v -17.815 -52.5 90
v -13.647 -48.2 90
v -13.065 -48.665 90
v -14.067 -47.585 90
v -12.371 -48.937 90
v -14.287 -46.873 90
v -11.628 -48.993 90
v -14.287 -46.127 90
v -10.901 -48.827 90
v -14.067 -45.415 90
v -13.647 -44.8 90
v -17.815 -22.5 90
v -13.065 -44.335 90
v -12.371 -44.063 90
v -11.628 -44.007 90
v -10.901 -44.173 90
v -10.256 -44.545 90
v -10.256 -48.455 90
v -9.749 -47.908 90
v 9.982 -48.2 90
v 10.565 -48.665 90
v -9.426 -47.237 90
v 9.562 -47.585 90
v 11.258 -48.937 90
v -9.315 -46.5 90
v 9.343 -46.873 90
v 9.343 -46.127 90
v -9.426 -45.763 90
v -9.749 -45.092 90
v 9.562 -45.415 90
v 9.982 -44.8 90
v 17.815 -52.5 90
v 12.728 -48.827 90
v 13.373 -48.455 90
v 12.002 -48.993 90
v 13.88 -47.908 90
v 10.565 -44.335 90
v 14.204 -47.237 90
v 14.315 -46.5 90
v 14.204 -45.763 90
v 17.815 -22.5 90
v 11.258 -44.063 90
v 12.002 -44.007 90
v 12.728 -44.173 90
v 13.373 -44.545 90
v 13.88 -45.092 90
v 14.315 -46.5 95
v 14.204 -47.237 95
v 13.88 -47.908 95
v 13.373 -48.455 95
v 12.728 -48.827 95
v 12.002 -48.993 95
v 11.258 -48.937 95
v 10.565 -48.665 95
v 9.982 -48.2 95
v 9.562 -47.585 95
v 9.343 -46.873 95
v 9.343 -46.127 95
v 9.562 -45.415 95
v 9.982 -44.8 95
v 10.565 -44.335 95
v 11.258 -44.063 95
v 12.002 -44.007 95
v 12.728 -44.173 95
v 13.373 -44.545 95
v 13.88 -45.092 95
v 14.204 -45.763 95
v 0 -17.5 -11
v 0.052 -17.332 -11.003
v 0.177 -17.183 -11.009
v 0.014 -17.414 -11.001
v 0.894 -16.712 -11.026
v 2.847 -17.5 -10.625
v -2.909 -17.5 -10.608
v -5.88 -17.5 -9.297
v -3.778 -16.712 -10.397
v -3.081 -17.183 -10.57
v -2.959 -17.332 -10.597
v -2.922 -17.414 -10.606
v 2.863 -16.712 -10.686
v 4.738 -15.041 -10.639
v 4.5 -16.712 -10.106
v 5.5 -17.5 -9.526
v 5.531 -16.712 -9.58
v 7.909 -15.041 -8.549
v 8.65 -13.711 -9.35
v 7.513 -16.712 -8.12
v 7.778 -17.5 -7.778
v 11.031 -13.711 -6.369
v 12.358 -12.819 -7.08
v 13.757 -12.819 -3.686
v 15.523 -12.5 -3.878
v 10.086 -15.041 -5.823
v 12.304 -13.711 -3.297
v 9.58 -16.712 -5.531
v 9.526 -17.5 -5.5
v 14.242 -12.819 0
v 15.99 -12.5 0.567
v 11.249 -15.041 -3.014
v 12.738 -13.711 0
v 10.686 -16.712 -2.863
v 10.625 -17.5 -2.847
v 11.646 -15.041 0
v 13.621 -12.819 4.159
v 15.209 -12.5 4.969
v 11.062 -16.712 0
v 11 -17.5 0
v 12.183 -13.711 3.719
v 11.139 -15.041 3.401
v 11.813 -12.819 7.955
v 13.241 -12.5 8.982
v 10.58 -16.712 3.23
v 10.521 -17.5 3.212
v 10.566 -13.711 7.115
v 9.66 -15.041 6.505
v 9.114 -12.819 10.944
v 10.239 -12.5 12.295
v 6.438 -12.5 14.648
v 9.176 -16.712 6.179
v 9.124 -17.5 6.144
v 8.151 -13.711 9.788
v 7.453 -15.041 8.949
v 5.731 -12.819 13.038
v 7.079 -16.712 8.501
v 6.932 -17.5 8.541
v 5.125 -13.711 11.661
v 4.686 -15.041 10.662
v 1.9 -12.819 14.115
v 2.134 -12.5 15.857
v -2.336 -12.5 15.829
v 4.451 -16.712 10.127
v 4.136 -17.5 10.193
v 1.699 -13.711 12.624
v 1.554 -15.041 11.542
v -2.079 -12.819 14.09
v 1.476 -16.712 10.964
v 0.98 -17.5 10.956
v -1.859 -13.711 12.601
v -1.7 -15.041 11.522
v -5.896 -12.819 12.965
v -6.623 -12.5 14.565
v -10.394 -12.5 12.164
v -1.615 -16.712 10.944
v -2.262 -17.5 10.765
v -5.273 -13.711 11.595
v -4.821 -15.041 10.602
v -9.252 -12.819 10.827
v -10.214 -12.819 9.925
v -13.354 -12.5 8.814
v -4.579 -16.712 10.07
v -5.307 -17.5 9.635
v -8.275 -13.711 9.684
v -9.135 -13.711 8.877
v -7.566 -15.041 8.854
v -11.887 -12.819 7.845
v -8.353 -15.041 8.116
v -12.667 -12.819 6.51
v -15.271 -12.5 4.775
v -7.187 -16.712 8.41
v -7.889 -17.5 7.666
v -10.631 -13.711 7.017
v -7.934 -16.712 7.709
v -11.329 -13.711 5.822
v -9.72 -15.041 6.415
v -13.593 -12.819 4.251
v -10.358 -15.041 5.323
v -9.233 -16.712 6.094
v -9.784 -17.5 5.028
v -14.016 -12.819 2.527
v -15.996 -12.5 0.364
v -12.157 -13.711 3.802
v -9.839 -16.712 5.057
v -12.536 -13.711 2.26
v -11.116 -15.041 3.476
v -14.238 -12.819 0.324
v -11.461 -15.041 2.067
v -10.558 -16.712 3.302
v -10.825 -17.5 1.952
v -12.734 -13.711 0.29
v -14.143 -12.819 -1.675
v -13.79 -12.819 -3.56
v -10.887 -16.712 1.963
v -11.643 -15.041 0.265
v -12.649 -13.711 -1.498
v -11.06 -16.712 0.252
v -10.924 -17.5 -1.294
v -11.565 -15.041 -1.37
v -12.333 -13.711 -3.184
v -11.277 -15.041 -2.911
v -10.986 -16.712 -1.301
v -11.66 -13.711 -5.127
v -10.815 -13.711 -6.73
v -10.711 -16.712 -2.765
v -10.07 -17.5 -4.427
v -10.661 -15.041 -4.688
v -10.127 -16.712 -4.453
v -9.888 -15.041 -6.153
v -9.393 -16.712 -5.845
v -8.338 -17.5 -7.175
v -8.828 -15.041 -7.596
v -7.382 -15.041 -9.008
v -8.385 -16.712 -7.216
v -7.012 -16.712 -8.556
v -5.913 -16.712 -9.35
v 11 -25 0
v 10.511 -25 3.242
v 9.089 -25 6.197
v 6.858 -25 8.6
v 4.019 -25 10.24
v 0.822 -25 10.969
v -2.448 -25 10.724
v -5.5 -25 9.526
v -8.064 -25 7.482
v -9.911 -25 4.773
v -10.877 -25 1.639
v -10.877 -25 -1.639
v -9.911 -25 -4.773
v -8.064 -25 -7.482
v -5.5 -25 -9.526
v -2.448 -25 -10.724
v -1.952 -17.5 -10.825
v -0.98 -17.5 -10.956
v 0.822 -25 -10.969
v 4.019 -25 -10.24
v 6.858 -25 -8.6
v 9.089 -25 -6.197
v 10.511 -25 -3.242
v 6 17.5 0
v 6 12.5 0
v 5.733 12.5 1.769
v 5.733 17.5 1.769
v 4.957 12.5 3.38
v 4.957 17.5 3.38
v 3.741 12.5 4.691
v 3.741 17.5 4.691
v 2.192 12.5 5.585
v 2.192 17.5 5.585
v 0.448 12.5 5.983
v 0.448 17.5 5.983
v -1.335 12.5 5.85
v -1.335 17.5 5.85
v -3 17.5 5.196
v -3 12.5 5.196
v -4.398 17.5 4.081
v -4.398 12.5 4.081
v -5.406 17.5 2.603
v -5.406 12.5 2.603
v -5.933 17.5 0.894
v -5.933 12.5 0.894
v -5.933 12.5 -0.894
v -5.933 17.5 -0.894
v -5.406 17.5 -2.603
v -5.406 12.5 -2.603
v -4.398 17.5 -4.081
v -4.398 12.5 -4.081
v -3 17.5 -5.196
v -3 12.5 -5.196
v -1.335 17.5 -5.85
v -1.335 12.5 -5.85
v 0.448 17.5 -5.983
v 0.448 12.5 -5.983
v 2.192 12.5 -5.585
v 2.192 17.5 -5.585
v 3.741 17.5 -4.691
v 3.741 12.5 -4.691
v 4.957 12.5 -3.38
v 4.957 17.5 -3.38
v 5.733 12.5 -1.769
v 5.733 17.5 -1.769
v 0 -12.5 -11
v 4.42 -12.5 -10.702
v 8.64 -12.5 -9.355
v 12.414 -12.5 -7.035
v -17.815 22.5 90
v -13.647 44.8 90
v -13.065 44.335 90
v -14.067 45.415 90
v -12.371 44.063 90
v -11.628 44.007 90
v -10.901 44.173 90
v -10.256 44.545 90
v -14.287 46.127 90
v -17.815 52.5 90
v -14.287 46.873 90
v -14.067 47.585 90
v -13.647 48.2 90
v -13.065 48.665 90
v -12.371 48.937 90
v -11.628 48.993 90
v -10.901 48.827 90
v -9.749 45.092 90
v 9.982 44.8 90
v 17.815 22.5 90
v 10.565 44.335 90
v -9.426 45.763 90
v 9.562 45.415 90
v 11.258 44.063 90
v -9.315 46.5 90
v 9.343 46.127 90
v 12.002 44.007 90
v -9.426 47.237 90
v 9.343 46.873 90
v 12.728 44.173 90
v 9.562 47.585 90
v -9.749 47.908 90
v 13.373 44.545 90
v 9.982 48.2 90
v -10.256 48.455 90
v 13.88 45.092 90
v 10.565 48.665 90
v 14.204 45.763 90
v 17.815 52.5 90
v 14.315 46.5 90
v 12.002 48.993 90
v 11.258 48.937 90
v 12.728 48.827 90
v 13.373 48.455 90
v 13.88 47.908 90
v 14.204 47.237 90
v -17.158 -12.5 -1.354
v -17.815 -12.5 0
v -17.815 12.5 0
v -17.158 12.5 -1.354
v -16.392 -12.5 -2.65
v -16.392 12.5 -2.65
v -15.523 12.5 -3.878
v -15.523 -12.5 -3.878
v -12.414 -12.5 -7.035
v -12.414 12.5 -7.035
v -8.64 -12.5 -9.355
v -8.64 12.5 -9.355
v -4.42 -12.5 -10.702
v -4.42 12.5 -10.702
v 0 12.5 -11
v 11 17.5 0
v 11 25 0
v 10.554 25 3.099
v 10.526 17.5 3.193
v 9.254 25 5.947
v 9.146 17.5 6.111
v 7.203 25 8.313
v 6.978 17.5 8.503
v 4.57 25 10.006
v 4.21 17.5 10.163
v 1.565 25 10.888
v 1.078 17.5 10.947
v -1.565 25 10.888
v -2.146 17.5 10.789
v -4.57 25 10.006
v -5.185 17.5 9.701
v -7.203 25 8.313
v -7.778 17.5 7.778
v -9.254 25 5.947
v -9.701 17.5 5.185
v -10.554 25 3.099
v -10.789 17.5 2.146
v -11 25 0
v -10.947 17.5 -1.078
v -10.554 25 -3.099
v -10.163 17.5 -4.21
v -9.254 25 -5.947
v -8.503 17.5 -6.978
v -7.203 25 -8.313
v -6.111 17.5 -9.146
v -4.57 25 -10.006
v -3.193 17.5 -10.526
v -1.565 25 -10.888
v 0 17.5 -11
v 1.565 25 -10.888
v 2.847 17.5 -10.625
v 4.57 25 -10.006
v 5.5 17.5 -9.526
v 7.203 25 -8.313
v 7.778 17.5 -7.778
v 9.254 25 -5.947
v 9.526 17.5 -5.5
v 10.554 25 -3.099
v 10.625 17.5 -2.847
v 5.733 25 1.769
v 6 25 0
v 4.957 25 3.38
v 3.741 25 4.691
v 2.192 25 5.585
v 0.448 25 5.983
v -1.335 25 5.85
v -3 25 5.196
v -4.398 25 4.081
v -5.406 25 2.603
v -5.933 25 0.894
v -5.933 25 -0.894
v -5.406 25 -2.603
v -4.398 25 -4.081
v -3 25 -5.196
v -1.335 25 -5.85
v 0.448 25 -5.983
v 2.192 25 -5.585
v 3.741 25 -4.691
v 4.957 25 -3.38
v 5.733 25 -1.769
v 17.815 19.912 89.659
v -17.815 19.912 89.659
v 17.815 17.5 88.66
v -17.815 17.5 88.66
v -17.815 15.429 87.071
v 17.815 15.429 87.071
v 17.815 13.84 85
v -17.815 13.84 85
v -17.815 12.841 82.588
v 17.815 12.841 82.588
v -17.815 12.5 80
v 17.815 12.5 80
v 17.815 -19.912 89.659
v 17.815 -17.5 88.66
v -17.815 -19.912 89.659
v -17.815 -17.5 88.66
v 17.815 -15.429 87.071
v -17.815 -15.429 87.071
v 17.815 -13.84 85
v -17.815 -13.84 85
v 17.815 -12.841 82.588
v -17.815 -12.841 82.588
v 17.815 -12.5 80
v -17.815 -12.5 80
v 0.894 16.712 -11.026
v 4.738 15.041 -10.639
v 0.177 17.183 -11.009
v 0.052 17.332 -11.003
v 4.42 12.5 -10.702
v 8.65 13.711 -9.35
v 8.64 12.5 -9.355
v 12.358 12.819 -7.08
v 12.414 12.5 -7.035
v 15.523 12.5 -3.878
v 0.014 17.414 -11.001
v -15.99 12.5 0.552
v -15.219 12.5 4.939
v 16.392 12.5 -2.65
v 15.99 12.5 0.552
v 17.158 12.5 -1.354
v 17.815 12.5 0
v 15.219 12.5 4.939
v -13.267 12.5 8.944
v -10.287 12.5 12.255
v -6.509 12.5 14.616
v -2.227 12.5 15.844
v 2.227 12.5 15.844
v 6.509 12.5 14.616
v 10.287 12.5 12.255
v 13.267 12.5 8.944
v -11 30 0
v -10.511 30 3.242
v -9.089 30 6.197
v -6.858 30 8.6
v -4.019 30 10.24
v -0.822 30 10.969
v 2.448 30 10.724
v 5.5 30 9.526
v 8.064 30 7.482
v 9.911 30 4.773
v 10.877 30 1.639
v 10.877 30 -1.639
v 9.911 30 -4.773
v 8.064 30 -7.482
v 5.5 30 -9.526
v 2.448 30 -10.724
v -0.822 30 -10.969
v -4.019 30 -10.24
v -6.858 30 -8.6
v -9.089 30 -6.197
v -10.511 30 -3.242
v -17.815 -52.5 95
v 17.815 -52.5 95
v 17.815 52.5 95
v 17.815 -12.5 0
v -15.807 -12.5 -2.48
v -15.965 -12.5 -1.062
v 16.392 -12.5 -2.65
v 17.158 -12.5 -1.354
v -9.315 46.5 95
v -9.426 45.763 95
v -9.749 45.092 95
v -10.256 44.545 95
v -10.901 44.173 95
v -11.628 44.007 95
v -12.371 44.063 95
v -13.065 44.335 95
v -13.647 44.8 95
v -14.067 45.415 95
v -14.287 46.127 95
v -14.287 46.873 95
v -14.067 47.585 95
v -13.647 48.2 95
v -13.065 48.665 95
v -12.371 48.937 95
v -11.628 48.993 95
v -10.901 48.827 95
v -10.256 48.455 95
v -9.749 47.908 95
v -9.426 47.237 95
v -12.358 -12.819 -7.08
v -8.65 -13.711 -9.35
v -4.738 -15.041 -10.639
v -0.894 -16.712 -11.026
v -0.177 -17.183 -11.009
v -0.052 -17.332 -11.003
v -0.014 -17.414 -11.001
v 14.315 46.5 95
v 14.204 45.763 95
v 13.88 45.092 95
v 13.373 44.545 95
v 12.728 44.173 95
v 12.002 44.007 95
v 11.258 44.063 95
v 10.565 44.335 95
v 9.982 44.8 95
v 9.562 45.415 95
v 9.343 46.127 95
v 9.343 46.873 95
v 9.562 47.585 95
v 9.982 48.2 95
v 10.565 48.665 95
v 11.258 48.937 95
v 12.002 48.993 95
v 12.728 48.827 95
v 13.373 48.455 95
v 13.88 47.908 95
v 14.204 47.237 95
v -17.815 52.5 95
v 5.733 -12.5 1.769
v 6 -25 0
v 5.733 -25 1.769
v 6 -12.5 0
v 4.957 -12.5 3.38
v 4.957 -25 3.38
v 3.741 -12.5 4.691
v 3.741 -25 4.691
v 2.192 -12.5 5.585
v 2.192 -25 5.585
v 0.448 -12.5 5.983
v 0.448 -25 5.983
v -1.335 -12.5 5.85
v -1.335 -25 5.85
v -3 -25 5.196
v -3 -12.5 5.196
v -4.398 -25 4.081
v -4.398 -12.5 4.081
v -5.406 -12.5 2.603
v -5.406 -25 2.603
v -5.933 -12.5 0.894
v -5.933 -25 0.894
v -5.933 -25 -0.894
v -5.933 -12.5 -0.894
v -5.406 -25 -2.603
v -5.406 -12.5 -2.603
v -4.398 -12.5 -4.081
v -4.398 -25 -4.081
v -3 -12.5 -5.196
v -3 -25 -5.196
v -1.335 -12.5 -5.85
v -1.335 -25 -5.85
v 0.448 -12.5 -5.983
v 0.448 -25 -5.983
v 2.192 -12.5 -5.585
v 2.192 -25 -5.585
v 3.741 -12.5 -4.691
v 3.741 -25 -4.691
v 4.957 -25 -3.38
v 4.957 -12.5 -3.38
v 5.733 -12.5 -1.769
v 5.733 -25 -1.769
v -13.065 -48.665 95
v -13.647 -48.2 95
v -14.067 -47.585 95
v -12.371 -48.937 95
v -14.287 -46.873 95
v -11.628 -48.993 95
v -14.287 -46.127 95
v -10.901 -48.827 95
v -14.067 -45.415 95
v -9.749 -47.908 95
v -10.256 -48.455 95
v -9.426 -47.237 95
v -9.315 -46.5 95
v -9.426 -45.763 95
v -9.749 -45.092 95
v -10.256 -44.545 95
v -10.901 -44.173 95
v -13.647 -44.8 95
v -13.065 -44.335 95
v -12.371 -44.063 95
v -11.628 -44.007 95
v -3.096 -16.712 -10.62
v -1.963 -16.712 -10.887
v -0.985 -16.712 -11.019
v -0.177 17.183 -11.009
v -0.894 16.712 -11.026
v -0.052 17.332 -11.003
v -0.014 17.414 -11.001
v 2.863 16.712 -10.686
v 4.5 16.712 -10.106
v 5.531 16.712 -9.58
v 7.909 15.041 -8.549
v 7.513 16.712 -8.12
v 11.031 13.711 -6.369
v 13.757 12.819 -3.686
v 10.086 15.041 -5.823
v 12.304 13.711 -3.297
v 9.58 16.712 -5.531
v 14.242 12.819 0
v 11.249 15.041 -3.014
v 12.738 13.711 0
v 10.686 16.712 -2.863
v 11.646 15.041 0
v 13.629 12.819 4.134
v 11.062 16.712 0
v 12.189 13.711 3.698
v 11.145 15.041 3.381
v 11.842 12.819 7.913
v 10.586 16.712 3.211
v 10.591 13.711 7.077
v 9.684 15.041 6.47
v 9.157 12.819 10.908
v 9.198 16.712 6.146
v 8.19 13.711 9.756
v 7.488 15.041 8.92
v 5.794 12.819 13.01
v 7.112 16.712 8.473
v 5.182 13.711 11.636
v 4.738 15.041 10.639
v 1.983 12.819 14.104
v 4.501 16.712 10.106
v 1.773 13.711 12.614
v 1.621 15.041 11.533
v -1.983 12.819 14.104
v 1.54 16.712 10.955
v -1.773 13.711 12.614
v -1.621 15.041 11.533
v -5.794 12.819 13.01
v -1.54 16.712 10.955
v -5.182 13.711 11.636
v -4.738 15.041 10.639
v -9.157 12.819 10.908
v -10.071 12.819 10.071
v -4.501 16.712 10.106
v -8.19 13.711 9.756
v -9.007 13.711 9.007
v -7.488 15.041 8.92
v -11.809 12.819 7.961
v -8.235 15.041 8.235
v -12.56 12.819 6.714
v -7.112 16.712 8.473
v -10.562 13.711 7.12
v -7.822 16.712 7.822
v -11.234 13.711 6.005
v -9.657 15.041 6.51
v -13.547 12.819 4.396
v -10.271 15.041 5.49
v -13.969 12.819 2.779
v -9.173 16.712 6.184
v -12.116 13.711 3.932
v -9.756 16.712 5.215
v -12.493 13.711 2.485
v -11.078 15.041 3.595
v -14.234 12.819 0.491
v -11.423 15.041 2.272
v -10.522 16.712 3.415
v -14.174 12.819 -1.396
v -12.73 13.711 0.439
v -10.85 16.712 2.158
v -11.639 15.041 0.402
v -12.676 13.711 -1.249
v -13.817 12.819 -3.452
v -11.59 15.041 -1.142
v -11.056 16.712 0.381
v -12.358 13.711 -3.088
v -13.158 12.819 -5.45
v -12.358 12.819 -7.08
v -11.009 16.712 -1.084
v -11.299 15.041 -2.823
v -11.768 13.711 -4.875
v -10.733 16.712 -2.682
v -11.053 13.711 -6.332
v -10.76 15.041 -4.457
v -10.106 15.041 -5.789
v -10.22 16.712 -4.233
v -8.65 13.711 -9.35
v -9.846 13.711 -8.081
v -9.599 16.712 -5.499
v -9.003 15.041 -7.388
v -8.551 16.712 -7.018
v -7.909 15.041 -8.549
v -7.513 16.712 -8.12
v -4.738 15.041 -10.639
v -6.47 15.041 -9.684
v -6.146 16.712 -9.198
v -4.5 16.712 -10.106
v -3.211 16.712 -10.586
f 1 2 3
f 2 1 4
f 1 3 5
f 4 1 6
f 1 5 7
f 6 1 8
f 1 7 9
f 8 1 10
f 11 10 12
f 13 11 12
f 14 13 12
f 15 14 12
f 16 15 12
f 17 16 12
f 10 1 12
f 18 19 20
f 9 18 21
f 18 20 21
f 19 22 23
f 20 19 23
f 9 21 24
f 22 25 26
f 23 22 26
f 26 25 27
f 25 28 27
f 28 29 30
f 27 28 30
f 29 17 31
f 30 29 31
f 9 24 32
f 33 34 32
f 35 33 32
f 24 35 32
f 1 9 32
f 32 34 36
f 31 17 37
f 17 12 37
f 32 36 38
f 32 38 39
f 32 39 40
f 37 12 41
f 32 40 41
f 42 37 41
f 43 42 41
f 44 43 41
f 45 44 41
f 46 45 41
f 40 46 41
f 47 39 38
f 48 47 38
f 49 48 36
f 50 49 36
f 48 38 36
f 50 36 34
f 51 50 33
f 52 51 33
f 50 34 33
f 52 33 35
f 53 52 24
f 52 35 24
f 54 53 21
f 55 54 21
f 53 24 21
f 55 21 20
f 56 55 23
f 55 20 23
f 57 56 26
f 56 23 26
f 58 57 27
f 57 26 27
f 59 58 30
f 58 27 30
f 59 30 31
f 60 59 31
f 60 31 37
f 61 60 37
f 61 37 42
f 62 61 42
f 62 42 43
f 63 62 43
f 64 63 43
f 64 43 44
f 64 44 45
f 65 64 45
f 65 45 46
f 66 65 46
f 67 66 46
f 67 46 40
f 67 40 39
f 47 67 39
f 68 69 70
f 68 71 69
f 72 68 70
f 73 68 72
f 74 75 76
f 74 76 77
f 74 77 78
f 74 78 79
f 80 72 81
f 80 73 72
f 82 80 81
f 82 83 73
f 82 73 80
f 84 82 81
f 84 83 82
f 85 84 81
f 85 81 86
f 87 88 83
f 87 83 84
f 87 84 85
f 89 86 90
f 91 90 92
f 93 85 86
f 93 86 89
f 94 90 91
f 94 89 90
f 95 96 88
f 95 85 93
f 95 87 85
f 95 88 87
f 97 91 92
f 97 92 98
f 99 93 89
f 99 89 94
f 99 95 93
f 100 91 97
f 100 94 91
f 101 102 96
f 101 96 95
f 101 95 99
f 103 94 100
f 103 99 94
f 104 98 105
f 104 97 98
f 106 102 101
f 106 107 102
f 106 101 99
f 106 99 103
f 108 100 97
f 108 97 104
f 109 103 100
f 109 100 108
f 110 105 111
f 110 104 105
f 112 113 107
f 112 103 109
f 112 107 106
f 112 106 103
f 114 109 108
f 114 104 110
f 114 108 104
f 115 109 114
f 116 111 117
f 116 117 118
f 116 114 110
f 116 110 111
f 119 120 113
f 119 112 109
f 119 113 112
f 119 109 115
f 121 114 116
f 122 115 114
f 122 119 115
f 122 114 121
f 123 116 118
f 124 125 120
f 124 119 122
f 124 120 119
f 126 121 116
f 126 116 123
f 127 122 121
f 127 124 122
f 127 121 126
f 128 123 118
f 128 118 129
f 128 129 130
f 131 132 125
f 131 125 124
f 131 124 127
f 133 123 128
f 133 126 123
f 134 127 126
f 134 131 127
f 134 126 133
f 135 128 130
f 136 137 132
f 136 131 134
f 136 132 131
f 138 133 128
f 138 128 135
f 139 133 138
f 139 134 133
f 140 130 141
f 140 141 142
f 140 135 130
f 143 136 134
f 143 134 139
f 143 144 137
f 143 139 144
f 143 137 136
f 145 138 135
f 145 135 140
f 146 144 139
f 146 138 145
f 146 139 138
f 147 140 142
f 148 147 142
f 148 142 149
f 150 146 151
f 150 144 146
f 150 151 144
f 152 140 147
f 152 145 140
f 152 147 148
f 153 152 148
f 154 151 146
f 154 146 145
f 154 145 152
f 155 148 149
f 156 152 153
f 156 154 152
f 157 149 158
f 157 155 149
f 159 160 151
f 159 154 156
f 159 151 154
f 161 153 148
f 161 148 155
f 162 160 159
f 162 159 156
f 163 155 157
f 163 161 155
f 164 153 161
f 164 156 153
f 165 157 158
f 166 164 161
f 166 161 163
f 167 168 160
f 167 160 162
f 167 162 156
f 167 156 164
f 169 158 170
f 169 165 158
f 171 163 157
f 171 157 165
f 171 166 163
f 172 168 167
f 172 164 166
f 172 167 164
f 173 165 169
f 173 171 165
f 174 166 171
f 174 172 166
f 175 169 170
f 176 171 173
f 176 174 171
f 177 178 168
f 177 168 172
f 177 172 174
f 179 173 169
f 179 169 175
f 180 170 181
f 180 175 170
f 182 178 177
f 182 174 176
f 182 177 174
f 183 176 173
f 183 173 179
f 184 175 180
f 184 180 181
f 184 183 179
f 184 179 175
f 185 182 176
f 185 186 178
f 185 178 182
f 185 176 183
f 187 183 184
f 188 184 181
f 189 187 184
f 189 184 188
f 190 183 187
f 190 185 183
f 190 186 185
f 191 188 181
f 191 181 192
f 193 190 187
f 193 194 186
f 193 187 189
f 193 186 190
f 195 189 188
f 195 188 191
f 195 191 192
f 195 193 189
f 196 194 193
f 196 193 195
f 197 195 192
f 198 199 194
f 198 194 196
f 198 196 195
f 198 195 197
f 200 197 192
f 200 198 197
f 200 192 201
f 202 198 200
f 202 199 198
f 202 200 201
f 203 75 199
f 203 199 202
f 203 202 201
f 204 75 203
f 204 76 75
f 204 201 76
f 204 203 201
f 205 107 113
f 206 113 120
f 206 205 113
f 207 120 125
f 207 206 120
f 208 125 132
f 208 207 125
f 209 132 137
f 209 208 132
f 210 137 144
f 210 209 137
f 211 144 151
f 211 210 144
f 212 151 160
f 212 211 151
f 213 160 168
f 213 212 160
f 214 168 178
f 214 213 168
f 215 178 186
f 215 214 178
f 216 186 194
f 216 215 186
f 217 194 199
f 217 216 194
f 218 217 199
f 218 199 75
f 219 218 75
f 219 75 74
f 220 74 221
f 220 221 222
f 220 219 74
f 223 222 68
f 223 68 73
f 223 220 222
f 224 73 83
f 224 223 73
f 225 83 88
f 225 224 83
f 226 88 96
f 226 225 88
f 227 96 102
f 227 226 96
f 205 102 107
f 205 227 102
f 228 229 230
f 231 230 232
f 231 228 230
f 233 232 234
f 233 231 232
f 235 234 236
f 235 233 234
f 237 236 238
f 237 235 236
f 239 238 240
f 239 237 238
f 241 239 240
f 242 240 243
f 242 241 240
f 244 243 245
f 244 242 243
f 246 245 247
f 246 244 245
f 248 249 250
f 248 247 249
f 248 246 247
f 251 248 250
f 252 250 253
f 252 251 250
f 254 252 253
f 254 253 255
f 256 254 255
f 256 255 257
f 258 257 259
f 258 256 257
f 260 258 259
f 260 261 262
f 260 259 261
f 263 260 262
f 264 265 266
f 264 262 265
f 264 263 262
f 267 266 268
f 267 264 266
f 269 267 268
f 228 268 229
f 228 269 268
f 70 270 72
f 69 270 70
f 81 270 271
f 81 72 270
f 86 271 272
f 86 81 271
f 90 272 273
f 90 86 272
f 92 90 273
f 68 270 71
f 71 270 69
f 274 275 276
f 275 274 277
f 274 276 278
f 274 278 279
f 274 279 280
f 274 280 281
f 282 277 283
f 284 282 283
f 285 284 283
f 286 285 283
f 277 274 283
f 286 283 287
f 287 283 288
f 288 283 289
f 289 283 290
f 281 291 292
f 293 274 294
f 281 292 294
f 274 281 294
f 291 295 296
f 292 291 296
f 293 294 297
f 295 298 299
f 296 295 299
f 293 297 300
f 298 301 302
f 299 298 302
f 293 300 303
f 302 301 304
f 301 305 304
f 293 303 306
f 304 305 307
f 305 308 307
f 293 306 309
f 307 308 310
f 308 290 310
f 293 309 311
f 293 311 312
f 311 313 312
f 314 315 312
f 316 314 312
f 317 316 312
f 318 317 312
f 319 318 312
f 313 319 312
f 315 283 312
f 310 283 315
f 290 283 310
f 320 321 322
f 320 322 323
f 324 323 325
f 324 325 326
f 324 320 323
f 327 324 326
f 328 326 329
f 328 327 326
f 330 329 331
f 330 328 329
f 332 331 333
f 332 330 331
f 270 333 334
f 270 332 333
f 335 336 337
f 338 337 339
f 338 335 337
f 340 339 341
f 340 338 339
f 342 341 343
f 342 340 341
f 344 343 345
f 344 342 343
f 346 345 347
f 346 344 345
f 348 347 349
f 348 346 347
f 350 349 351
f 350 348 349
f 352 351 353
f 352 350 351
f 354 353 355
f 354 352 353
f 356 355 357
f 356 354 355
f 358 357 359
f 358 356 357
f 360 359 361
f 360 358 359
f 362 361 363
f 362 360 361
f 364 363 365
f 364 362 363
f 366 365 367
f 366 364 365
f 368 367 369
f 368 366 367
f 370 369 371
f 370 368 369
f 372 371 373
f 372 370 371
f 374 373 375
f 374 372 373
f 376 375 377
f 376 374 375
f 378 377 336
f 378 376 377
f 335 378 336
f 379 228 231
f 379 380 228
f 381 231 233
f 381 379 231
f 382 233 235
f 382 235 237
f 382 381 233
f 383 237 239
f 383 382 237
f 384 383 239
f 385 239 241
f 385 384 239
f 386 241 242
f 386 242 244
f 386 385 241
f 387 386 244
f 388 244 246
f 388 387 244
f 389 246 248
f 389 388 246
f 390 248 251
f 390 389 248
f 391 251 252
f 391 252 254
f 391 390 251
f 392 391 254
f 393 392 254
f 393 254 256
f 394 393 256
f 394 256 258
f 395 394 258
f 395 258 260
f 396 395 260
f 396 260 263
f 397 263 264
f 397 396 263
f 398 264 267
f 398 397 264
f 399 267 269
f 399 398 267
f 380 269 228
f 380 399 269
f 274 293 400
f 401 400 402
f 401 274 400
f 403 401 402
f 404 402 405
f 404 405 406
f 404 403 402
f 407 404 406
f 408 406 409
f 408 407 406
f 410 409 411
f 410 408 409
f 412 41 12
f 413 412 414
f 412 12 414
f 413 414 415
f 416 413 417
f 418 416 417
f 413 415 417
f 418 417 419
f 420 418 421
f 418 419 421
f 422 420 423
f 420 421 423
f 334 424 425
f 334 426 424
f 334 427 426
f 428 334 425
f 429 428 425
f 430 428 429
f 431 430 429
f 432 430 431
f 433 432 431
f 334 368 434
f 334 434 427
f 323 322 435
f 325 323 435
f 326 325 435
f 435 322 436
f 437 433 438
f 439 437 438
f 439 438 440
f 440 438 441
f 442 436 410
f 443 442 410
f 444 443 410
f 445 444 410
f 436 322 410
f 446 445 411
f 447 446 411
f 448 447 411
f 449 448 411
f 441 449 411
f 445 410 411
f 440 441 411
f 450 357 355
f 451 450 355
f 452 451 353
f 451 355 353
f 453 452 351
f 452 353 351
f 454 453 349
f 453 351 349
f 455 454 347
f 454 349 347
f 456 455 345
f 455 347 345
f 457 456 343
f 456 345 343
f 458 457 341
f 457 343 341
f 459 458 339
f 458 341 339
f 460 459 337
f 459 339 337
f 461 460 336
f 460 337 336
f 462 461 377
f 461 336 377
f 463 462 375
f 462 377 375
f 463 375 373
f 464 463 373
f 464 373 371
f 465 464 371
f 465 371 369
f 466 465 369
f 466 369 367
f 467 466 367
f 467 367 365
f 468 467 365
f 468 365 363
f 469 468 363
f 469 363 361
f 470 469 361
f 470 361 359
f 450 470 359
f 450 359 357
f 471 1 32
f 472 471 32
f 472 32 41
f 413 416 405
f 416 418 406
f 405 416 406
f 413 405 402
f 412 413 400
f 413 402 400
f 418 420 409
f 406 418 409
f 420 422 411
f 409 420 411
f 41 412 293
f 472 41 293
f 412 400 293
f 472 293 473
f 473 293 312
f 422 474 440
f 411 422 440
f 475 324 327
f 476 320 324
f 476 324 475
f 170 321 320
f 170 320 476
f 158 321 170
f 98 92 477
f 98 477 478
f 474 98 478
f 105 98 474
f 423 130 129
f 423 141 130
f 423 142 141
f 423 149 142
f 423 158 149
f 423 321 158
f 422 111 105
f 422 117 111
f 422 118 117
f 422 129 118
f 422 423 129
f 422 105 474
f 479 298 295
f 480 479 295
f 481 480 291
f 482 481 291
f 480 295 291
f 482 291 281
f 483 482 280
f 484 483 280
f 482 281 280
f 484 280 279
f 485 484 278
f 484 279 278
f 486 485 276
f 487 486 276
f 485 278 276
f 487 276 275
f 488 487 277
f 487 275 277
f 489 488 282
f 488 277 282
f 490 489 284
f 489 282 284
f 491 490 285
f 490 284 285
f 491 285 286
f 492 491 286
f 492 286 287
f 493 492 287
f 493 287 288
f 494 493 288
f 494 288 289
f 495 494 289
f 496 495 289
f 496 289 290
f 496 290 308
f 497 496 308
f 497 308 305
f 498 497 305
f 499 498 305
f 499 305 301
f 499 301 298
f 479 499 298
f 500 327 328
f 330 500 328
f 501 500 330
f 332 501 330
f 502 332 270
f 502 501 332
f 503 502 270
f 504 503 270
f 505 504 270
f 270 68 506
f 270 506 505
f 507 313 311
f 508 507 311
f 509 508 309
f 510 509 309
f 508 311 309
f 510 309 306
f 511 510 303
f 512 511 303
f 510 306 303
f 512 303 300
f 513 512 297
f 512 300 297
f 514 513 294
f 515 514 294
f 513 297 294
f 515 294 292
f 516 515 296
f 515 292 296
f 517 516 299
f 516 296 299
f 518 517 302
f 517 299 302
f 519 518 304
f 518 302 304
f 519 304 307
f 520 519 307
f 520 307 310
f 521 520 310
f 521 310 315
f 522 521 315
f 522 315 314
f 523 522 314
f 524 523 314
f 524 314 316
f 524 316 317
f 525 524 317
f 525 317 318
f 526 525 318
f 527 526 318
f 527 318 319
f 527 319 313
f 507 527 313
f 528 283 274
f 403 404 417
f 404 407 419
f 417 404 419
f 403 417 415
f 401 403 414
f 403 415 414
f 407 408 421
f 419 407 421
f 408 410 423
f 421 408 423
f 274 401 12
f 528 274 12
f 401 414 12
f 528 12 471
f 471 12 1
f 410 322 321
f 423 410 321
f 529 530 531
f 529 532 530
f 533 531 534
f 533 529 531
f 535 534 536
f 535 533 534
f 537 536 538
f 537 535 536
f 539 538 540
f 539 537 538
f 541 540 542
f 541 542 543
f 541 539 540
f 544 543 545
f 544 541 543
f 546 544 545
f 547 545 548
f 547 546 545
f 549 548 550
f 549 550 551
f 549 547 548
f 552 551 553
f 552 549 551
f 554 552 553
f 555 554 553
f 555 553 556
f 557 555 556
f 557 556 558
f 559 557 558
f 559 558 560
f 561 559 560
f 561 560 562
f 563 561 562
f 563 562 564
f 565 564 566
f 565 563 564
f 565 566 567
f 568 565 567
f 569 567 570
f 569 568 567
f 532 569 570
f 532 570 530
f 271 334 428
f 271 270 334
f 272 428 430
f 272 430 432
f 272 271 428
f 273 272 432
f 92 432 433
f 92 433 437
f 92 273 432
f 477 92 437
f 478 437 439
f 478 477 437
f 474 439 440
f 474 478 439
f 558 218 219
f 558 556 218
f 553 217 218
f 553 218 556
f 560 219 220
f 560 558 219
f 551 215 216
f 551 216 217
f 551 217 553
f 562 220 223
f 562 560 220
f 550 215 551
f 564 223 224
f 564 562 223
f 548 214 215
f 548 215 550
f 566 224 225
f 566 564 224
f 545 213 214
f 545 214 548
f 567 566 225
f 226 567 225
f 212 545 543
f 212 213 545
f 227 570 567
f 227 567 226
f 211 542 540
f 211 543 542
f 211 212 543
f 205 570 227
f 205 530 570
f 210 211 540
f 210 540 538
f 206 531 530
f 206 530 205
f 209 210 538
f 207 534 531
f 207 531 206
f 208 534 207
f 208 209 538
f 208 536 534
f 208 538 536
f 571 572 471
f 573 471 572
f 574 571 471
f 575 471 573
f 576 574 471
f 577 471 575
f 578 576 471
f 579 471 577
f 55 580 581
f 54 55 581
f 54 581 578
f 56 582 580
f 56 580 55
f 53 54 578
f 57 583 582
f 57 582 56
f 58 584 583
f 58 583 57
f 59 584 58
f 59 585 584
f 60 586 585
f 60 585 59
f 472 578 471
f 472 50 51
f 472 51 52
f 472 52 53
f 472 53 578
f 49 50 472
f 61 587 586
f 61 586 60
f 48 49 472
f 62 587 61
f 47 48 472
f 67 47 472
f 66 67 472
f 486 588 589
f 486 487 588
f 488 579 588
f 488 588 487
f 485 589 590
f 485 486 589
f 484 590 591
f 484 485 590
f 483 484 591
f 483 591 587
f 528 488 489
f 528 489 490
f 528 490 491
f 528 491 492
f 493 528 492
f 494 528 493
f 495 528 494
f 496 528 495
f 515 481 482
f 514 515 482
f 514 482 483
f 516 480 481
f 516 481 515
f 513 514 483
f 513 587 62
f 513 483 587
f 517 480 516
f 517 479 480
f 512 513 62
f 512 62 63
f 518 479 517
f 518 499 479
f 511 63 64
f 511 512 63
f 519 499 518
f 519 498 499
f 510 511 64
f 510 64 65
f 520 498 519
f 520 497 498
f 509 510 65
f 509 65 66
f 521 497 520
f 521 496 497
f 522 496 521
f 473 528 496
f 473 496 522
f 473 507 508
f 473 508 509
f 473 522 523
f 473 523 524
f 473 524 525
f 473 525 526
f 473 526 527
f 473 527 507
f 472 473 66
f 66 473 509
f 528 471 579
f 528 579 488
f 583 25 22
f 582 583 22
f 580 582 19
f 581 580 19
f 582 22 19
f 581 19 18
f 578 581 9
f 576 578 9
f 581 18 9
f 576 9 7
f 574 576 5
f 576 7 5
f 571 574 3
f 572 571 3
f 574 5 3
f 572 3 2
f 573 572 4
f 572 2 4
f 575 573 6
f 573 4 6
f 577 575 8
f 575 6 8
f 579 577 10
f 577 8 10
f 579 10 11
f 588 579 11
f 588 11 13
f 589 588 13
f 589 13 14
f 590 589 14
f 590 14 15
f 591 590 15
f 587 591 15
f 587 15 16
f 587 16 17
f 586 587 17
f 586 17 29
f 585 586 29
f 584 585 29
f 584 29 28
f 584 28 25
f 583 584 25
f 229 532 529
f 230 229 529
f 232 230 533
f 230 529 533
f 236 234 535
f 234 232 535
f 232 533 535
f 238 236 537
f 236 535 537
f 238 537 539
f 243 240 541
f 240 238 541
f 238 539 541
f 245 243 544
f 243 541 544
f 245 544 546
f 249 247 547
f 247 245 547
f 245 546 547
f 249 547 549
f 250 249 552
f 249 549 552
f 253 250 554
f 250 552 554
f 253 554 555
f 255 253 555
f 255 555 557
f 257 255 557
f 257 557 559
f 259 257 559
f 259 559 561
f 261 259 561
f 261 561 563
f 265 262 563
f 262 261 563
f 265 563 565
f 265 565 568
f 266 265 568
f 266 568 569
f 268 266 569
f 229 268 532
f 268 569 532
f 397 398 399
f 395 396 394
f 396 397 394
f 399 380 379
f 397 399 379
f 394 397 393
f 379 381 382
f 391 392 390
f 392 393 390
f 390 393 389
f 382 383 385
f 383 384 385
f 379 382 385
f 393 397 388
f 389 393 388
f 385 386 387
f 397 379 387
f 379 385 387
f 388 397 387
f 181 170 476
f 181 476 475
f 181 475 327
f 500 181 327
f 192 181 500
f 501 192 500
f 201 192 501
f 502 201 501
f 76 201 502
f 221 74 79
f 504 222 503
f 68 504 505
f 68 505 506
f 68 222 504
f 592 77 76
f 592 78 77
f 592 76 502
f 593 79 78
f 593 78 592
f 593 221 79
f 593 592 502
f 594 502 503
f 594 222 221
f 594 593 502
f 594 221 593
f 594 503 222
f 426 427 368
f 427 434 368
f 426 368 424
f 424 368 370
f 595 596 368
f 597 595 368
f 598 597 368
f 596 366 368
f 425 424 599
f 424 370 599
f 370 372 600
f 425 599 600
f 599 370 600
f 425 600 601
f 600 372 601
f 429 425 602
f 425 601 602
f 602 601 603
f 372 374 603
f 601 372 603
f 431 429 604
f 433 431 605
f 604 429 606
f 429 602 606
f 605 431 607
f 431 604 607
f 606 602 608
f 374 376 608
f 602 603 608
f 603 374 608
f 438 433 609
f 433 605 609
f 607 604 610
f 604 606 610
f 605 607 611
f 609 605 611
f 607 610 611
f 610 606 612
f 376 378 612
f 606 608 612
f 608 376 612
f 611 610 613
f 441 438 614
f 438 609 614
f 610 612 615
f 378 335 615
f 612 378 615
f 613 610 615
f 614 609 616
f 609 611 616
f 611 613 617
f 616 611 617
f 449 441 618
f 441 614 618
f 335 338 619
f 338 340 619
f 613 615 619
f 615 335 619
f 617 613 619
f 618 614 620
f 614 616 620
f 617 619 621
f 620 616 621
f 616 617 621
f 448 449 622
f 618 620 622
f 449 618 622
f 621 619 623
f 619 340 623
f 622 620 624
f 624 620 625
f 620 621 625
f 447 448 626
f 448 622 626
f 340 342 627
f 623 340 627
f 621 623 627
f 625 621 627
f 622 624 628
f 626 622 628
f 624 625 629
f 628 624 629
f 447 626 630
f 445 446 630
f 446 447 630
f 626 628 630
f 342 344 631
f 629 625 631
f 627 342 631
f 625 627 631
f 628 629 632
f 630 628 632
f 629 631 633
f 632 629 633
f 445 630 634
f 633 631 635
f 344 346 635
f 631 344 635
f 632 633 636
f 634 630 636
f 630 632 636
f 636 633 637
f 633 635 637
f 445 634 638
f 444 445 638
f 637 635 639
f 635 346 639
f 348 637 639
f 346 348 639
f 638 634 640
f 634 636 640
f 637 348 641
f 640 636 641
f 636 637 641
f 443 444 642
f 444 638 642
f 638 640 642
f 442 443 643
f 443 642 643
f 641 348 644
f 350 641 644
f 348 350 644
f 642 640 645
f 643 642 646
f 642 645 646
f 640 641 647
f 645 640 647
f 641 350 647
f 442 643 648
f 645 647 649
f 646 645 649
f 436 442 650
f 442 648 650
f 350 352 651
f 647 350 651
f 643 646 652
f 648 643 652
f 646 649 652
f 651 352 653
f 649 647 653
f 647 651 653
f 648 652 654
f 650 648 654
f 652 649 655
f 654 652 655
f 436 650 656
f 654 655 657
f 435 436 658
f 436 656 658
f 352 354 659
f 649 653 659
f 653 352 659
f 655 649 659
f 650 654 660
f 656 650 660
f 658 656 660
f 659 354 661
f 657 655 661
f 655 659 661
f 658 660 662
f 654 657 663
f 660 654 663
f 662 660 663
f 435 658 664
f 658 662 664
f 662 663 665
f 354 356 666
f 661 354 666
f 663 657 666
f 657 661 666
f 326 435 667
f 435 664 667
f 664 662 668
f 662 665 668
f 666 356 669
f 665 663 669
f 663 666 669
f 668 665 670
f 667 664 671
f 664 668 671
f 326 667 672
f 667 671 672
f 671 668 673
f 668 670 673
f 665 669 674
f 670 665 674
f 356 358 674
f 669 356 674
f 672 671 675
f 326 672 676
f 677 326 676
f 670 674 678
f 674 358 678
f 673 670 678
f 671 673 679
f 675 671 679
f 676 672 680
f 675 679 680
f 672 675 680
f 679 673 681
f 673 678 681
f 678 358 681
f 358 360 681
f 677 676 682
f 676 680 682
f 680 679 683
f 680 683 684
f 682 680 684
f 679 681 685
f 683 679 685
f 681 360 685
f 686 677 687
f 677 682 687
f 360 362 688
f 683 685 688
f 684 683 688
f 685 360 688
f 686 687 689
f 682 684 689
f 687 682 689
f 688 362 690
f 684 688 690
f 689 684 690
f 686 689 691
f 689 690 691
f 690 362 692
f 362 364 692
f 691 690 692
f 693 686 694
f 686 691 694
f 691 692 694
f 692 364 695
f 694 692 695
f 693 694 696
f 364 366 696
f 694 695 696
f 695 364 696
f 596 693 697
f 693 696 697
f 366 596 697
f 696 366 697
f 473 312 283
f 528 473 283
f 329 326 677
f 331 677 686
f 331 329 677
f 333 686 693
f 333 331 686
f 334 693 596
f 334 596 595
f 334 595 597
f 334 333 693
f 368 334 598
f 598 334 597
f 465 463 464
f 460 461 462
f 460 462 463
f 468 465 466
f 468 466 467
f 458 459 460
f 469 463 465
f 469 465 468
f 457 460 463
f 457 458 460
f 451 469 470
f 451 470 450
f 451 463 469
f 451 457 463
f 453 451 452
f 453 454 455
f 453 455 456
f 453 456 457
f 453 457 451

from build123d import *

# Parameters (mm, degrees)
F0_R         = 11
F0_R_2       = 6
F1_DEPTH     = 25
F2_R         = 11
F3_DEPTH     = 5
F5_DEPTH     = 12.5
F7_DEPTH     = 5
F8_R         = 10
F9_T4_ANGLE  = 90
F9_S5_R      = 18.3546430422
F9_T6_DEPTH  = 14
F9_T10_ANGLE = 270
F9_S11_R     = 18.3546430422
F9_T12_DEPTH = 26
F9_T16_ANGLE = 270
F9_S17_R     = 18.3546430422
F9_T18_DEPTH = 26
F9_T22_ANGLE = 270
F9_S23_R     = 18.3546430422
F9_T24_DEPTH = 26
F9_T28_ANGLE = 270
F9_S29_R     = 18.3546430422
F9_T30_DEPTH = 26
F9_T34_ANGLE = 90
F9_S35_R     = 18.3546430422
F9_T36_DEPTH = 14
F10_R        = 6
F11_DEPTH    = 30
F12_R        = 2.5
F13_DEPTH    = 5.001


# Not quite as in the source:
# - a fillet or chamfer that OpenCascade refuses, or shapes differently, is made with other operations: its cross-section is extruded or revolved along the edge and cut away or added


with BuildPart() as f1:
    # F0 (on Front) → F1 (new body, symmetric)
    with BuildSketch(Plane.XZ):
        Circle(F0_R)
        Circle(F0_R_2, mode=Mode.SUBTRACT)
    extrude(amount=F1_DEPTH, both=True)

    # F2 (on face) → F3 (join)
    with BuildSketch(Plane(origin=(0, 25, 0), x_dir=(-1, 0, 0), z_dir=(0, 1, 0))):
        Circle(F2_R)
    extrude(amount=F3_DEPTH)

    # F4 (on Front) → F5 (join, symmetric)
    with BuildSketch(Plane.XZ):
        with BuildLine():
            ThreePointArc((-17.8147200495, 0), (-10.6296195649, -8.2892337781), (0, -11))
            ThreePointArc((0, -11), (10.6296195649, -8.2892337781), (17.8147200495, 0))
            Line((17.8147200495, 0), (17.8147200495, 90))
            Line((17.8147200495, 90), (-17.8147200495, 90))
            Line((-17.8147200495, 90), (-17.8147200495, 0))
        make_face()
        with BuildLine():
            ThreePointArc((0, -11), (-7.7781745931, 7.7781745931), (11, 0))
            ThreePointArc((11, 0), (7.7781745931, -7.7781745931), (0, -11))
        make_face(mode=Mode.SUBTRACT)
        with BuildLine():
            ThreePointArc((0, -11), (7.7781745931, -7.7781745931), (11, 0))
            ThreePointArc((11, 0), (-7.7781745931, 7.7781745931), (0, -11))
        make_face()
    extrude(amount=F5_DEPTH, both=True)

    # F6 (on face) → F7 (join)
    with BuildSketch(Plane.XY.offset(90)):
        Polygon((17.8147200495, -52.5), (17.8147200495, -12.5), (17.8147200495, 12.5), (17.8147200495, 52.5), (-17.8147200495, 52.5), (-17.8147200495, 12.5), (-17.8147200495, -12.5), (-17.8147200495, -52.5), align=None)
    extrude(amount=F7_DEPTH)

    # F8
    f8_edges = [f1.edges().sort_by_distance(p)[0] for p in [
        (0, -12.5, 90),
        (0, 12.5, 90),
    ]]
    fillet(f8_edges, radius=F8_R)

    # F9: fillet of radius 5 on 4 edges, made by hand


with BuildPart() as f9_tool2:
    # F9_s3 → F9_t4 (revolve)
    with BuildSketch(Plane.YZ):
        with BuildLine():
            ThreePointArc((-12.5, -16), (-13.9644660941, -12.4644660941), (-17.5, -11))
            Line((-17.5, -11), (-12.5, -11))
            Line((-12.5, -11), (-12.5, -16))
        make_face()
    revolve(axis=Axis((0, -12.5, 0), (0, -1, 0)), revolution_arc=F9_T4_ANGLE)

    # F9_s5 → F9_t6 (intersect, symmetric)
    with BuildSketch(Plane.XZ.offset(16.8)):
        with Locations((0.9864220241, 7.3281175465)):
            Circle(F9_S5_R)
    extrude(amount=F9_T6_DEPTH, both=True, mode=Mode.INTERSECT)


with BuildPart() as f1_1:
    add(f1.part)

    # F9_t1: union F9_tool2
    add(f9_tool2.part)


with BuildPart() as f9_tool8:
    # F9_s9 → F9_t10 (revolve)
    with BuildSketch(Plane.XY):
        with BuildLine():
            ThreePointArc((16, -12.5), (12.4644660941, -13.9644660941), (11, -17.5))
            Line((11, -17.5), (11, -12.5))
            Line((11, -12.5), (16, -12.5))
        make_face()
    revolve(axis=Axis((0, -12.5, 0), (0, -1, 0)), revolution_arc=F9_T10_ANGLE)

    # F9_s11 → F9_t12 (intersect, symmetric)
    with BuildSketch(Plane.XZ.offset(16.8)):
        with Locations((0.9864220241, 7.3281175465)):
            Circle(F9_S11_R)
    extrude(amount=F9_T12_DEPTH, both=True, mode=Mode.INTERSECT)


with BuildPart() as f1_2:
    add(f1_1.part)

    # F9_t7: union F9_tool8
    add(f9_tool8.part)


with BuildPart() as f9_tool14:
    # F9_s15 → F9_t16 (revolve)
    with BuildSketch(Plane.XY):
        with BuildLine():
            ThreePointArc((16, -12.5), (12.4644660941, -13.9644660941), (11, -17.5))
            Line((11, -17.5), (11, -12.5))
            Line((11, -12.5), (16, -12.5))
        make_face()
    revolve(axis=Axis((0, -12.5, 0), (0, -1, 0)), revolution_arc=F9_T16_ANGLE)

    # F9_s17 → F9_t18 (intersect, symmetric)
    with BuildSketch(Plane.XZ.offset(16.8)):
        with Locations((-0.9864220241, 7.3281175465)):
            Circle(F9_S17_R)
    extrude(amount=F9_T18_DEPTH, both=True, mode=Mode.INTERSECT)


with BuildPart() as f1_3:
    add(f1_2.part)

    # F9_t13: union F9_tool14
    add(f9_tool14.part)


with BuildPart() as f9_tool20:
    # F9_s21 → F9_t22 (revolve)
    with BuildSketch(Plane.XY):
        with BuildLine():
            ThreePointArc((16, 12.5), (12.4644660941, 13.9644660941), (11, 17.5))
            Line((11, 17.5), (11, 12.5))
            Line((11, 12.5), (16, 12.5))
        make_face()
    revolve(axis=Axis((0, 12.5, 0), (0, -1, 0)), revolution_arc=F9_T22_ANGLE)

    # F9_s23 → F9_t24 (intersect, symmetric)
    with BuildSketch(Plane.XZ.offset(-16.8)):
        with Locations((0.9864220241, 7.3281175465)):
            Circle(F9_S23_R)
    extrude(amount=F9_T24_DEPTH, both=True, mode=Mode.INTERSECT)


with BuildPart() as f1_4:
    add(f1_3.part)

    # F9_t19: union F9_tool20
    add(f9_tool20.part)


with BuildPart() as f9_tool26:
    # F9_s27 → F9_t28 (revolve)
    with BuildSketch(Plane.XY):
        with BuildLine():
            ThreePointArc((16, 12.5), (12.4644660941, 13.9644660941), (11, 17.5))
            Line((11, 17.5), (11, 12.5))
            Line((11, 12.5), (16, 12.5))
        make_face()
    revolve(axis=Axis((0, 12.5, 0), (0, -1, 0)), revolution_arc=F9_T28_ANGLE)

    # F9_s29 → F9_t30 (intersect, symmetric)
    with BuildSketch(Plane.XZ.offset(-16.8)):
        with Locations((-0.9864220241, 7.3281175465)):
            Circle(F9_S29_R)
    extrude(amount=F9_T30_DEPTH, both=True, mode=Mode.INTERSECT)


with BuildPart() as f1_5:
    add(f1_4.part)

    # F9_t25: union F9_tool26
    add(f9_tool26.part)


with BuildPart() as f9_tool32:
    # F9_s33 → F9_t34 (revolve)
    with BuildSketch(Plane.YZ):
        with BuildLine():
            ThreePointArc((12.5, -16), (13.9644660941, -12.4644660941), (17.5, -11))
            Line((17.5, -11), (12.5, -11))
            Line((12.5, -11), (12.5, -16))
        make_face()
    revolve(axis=Axis((0, 12.5, 0), (0, -1, 0)), revolution_arc=F9_T34_ANGLE)

    # F9_s35 → F9_t36 (intersect, symmetric)
    with BuildSketch(Plane.XZ.offset(-16.8)):
        with Locations((0.9864220241, 7.3281175465)):
            Circle(F9_S35_R)
    extrude(amount=F9_T36_DEPTH, both=True, mode=Mode.INTERSECT)


with BuildPart() as f1_6:
    add(f1_5.part)

    # F9_t31: union F9_tool32
    add(f9_tool32.part)

    # F10 (on face) → F11 (cut)
    with BuildSketch(Plane.XZ.offset(12.5)):
        Circle(F10_R)
    extrude(amount=-F11_DEPTH, mode=Mode.SUBTRACT)

    # F12 (on face) → F13 (cut, through all)
    with BuildSketch(Plane(origin=(0, 0, 90), x_dir=(1, 0, 0), z_dir=(0, 0, -1))):
        with Locations((-11.8147200495, 46.5)):
            Circle(F12_R)
        with Locations((11.8147200495, 46.5)):
            Circle(F12_R)
        with Locations((-11.8147200495, -46.5)):
            Circle(F12_R)
        with Locations((11.8147200495, -46.5)):
            Circle(F12_R)
    extrude(amount=-F13_DEPTH, mode=Mode.SUBTRACT)


solid = f1_6.part
